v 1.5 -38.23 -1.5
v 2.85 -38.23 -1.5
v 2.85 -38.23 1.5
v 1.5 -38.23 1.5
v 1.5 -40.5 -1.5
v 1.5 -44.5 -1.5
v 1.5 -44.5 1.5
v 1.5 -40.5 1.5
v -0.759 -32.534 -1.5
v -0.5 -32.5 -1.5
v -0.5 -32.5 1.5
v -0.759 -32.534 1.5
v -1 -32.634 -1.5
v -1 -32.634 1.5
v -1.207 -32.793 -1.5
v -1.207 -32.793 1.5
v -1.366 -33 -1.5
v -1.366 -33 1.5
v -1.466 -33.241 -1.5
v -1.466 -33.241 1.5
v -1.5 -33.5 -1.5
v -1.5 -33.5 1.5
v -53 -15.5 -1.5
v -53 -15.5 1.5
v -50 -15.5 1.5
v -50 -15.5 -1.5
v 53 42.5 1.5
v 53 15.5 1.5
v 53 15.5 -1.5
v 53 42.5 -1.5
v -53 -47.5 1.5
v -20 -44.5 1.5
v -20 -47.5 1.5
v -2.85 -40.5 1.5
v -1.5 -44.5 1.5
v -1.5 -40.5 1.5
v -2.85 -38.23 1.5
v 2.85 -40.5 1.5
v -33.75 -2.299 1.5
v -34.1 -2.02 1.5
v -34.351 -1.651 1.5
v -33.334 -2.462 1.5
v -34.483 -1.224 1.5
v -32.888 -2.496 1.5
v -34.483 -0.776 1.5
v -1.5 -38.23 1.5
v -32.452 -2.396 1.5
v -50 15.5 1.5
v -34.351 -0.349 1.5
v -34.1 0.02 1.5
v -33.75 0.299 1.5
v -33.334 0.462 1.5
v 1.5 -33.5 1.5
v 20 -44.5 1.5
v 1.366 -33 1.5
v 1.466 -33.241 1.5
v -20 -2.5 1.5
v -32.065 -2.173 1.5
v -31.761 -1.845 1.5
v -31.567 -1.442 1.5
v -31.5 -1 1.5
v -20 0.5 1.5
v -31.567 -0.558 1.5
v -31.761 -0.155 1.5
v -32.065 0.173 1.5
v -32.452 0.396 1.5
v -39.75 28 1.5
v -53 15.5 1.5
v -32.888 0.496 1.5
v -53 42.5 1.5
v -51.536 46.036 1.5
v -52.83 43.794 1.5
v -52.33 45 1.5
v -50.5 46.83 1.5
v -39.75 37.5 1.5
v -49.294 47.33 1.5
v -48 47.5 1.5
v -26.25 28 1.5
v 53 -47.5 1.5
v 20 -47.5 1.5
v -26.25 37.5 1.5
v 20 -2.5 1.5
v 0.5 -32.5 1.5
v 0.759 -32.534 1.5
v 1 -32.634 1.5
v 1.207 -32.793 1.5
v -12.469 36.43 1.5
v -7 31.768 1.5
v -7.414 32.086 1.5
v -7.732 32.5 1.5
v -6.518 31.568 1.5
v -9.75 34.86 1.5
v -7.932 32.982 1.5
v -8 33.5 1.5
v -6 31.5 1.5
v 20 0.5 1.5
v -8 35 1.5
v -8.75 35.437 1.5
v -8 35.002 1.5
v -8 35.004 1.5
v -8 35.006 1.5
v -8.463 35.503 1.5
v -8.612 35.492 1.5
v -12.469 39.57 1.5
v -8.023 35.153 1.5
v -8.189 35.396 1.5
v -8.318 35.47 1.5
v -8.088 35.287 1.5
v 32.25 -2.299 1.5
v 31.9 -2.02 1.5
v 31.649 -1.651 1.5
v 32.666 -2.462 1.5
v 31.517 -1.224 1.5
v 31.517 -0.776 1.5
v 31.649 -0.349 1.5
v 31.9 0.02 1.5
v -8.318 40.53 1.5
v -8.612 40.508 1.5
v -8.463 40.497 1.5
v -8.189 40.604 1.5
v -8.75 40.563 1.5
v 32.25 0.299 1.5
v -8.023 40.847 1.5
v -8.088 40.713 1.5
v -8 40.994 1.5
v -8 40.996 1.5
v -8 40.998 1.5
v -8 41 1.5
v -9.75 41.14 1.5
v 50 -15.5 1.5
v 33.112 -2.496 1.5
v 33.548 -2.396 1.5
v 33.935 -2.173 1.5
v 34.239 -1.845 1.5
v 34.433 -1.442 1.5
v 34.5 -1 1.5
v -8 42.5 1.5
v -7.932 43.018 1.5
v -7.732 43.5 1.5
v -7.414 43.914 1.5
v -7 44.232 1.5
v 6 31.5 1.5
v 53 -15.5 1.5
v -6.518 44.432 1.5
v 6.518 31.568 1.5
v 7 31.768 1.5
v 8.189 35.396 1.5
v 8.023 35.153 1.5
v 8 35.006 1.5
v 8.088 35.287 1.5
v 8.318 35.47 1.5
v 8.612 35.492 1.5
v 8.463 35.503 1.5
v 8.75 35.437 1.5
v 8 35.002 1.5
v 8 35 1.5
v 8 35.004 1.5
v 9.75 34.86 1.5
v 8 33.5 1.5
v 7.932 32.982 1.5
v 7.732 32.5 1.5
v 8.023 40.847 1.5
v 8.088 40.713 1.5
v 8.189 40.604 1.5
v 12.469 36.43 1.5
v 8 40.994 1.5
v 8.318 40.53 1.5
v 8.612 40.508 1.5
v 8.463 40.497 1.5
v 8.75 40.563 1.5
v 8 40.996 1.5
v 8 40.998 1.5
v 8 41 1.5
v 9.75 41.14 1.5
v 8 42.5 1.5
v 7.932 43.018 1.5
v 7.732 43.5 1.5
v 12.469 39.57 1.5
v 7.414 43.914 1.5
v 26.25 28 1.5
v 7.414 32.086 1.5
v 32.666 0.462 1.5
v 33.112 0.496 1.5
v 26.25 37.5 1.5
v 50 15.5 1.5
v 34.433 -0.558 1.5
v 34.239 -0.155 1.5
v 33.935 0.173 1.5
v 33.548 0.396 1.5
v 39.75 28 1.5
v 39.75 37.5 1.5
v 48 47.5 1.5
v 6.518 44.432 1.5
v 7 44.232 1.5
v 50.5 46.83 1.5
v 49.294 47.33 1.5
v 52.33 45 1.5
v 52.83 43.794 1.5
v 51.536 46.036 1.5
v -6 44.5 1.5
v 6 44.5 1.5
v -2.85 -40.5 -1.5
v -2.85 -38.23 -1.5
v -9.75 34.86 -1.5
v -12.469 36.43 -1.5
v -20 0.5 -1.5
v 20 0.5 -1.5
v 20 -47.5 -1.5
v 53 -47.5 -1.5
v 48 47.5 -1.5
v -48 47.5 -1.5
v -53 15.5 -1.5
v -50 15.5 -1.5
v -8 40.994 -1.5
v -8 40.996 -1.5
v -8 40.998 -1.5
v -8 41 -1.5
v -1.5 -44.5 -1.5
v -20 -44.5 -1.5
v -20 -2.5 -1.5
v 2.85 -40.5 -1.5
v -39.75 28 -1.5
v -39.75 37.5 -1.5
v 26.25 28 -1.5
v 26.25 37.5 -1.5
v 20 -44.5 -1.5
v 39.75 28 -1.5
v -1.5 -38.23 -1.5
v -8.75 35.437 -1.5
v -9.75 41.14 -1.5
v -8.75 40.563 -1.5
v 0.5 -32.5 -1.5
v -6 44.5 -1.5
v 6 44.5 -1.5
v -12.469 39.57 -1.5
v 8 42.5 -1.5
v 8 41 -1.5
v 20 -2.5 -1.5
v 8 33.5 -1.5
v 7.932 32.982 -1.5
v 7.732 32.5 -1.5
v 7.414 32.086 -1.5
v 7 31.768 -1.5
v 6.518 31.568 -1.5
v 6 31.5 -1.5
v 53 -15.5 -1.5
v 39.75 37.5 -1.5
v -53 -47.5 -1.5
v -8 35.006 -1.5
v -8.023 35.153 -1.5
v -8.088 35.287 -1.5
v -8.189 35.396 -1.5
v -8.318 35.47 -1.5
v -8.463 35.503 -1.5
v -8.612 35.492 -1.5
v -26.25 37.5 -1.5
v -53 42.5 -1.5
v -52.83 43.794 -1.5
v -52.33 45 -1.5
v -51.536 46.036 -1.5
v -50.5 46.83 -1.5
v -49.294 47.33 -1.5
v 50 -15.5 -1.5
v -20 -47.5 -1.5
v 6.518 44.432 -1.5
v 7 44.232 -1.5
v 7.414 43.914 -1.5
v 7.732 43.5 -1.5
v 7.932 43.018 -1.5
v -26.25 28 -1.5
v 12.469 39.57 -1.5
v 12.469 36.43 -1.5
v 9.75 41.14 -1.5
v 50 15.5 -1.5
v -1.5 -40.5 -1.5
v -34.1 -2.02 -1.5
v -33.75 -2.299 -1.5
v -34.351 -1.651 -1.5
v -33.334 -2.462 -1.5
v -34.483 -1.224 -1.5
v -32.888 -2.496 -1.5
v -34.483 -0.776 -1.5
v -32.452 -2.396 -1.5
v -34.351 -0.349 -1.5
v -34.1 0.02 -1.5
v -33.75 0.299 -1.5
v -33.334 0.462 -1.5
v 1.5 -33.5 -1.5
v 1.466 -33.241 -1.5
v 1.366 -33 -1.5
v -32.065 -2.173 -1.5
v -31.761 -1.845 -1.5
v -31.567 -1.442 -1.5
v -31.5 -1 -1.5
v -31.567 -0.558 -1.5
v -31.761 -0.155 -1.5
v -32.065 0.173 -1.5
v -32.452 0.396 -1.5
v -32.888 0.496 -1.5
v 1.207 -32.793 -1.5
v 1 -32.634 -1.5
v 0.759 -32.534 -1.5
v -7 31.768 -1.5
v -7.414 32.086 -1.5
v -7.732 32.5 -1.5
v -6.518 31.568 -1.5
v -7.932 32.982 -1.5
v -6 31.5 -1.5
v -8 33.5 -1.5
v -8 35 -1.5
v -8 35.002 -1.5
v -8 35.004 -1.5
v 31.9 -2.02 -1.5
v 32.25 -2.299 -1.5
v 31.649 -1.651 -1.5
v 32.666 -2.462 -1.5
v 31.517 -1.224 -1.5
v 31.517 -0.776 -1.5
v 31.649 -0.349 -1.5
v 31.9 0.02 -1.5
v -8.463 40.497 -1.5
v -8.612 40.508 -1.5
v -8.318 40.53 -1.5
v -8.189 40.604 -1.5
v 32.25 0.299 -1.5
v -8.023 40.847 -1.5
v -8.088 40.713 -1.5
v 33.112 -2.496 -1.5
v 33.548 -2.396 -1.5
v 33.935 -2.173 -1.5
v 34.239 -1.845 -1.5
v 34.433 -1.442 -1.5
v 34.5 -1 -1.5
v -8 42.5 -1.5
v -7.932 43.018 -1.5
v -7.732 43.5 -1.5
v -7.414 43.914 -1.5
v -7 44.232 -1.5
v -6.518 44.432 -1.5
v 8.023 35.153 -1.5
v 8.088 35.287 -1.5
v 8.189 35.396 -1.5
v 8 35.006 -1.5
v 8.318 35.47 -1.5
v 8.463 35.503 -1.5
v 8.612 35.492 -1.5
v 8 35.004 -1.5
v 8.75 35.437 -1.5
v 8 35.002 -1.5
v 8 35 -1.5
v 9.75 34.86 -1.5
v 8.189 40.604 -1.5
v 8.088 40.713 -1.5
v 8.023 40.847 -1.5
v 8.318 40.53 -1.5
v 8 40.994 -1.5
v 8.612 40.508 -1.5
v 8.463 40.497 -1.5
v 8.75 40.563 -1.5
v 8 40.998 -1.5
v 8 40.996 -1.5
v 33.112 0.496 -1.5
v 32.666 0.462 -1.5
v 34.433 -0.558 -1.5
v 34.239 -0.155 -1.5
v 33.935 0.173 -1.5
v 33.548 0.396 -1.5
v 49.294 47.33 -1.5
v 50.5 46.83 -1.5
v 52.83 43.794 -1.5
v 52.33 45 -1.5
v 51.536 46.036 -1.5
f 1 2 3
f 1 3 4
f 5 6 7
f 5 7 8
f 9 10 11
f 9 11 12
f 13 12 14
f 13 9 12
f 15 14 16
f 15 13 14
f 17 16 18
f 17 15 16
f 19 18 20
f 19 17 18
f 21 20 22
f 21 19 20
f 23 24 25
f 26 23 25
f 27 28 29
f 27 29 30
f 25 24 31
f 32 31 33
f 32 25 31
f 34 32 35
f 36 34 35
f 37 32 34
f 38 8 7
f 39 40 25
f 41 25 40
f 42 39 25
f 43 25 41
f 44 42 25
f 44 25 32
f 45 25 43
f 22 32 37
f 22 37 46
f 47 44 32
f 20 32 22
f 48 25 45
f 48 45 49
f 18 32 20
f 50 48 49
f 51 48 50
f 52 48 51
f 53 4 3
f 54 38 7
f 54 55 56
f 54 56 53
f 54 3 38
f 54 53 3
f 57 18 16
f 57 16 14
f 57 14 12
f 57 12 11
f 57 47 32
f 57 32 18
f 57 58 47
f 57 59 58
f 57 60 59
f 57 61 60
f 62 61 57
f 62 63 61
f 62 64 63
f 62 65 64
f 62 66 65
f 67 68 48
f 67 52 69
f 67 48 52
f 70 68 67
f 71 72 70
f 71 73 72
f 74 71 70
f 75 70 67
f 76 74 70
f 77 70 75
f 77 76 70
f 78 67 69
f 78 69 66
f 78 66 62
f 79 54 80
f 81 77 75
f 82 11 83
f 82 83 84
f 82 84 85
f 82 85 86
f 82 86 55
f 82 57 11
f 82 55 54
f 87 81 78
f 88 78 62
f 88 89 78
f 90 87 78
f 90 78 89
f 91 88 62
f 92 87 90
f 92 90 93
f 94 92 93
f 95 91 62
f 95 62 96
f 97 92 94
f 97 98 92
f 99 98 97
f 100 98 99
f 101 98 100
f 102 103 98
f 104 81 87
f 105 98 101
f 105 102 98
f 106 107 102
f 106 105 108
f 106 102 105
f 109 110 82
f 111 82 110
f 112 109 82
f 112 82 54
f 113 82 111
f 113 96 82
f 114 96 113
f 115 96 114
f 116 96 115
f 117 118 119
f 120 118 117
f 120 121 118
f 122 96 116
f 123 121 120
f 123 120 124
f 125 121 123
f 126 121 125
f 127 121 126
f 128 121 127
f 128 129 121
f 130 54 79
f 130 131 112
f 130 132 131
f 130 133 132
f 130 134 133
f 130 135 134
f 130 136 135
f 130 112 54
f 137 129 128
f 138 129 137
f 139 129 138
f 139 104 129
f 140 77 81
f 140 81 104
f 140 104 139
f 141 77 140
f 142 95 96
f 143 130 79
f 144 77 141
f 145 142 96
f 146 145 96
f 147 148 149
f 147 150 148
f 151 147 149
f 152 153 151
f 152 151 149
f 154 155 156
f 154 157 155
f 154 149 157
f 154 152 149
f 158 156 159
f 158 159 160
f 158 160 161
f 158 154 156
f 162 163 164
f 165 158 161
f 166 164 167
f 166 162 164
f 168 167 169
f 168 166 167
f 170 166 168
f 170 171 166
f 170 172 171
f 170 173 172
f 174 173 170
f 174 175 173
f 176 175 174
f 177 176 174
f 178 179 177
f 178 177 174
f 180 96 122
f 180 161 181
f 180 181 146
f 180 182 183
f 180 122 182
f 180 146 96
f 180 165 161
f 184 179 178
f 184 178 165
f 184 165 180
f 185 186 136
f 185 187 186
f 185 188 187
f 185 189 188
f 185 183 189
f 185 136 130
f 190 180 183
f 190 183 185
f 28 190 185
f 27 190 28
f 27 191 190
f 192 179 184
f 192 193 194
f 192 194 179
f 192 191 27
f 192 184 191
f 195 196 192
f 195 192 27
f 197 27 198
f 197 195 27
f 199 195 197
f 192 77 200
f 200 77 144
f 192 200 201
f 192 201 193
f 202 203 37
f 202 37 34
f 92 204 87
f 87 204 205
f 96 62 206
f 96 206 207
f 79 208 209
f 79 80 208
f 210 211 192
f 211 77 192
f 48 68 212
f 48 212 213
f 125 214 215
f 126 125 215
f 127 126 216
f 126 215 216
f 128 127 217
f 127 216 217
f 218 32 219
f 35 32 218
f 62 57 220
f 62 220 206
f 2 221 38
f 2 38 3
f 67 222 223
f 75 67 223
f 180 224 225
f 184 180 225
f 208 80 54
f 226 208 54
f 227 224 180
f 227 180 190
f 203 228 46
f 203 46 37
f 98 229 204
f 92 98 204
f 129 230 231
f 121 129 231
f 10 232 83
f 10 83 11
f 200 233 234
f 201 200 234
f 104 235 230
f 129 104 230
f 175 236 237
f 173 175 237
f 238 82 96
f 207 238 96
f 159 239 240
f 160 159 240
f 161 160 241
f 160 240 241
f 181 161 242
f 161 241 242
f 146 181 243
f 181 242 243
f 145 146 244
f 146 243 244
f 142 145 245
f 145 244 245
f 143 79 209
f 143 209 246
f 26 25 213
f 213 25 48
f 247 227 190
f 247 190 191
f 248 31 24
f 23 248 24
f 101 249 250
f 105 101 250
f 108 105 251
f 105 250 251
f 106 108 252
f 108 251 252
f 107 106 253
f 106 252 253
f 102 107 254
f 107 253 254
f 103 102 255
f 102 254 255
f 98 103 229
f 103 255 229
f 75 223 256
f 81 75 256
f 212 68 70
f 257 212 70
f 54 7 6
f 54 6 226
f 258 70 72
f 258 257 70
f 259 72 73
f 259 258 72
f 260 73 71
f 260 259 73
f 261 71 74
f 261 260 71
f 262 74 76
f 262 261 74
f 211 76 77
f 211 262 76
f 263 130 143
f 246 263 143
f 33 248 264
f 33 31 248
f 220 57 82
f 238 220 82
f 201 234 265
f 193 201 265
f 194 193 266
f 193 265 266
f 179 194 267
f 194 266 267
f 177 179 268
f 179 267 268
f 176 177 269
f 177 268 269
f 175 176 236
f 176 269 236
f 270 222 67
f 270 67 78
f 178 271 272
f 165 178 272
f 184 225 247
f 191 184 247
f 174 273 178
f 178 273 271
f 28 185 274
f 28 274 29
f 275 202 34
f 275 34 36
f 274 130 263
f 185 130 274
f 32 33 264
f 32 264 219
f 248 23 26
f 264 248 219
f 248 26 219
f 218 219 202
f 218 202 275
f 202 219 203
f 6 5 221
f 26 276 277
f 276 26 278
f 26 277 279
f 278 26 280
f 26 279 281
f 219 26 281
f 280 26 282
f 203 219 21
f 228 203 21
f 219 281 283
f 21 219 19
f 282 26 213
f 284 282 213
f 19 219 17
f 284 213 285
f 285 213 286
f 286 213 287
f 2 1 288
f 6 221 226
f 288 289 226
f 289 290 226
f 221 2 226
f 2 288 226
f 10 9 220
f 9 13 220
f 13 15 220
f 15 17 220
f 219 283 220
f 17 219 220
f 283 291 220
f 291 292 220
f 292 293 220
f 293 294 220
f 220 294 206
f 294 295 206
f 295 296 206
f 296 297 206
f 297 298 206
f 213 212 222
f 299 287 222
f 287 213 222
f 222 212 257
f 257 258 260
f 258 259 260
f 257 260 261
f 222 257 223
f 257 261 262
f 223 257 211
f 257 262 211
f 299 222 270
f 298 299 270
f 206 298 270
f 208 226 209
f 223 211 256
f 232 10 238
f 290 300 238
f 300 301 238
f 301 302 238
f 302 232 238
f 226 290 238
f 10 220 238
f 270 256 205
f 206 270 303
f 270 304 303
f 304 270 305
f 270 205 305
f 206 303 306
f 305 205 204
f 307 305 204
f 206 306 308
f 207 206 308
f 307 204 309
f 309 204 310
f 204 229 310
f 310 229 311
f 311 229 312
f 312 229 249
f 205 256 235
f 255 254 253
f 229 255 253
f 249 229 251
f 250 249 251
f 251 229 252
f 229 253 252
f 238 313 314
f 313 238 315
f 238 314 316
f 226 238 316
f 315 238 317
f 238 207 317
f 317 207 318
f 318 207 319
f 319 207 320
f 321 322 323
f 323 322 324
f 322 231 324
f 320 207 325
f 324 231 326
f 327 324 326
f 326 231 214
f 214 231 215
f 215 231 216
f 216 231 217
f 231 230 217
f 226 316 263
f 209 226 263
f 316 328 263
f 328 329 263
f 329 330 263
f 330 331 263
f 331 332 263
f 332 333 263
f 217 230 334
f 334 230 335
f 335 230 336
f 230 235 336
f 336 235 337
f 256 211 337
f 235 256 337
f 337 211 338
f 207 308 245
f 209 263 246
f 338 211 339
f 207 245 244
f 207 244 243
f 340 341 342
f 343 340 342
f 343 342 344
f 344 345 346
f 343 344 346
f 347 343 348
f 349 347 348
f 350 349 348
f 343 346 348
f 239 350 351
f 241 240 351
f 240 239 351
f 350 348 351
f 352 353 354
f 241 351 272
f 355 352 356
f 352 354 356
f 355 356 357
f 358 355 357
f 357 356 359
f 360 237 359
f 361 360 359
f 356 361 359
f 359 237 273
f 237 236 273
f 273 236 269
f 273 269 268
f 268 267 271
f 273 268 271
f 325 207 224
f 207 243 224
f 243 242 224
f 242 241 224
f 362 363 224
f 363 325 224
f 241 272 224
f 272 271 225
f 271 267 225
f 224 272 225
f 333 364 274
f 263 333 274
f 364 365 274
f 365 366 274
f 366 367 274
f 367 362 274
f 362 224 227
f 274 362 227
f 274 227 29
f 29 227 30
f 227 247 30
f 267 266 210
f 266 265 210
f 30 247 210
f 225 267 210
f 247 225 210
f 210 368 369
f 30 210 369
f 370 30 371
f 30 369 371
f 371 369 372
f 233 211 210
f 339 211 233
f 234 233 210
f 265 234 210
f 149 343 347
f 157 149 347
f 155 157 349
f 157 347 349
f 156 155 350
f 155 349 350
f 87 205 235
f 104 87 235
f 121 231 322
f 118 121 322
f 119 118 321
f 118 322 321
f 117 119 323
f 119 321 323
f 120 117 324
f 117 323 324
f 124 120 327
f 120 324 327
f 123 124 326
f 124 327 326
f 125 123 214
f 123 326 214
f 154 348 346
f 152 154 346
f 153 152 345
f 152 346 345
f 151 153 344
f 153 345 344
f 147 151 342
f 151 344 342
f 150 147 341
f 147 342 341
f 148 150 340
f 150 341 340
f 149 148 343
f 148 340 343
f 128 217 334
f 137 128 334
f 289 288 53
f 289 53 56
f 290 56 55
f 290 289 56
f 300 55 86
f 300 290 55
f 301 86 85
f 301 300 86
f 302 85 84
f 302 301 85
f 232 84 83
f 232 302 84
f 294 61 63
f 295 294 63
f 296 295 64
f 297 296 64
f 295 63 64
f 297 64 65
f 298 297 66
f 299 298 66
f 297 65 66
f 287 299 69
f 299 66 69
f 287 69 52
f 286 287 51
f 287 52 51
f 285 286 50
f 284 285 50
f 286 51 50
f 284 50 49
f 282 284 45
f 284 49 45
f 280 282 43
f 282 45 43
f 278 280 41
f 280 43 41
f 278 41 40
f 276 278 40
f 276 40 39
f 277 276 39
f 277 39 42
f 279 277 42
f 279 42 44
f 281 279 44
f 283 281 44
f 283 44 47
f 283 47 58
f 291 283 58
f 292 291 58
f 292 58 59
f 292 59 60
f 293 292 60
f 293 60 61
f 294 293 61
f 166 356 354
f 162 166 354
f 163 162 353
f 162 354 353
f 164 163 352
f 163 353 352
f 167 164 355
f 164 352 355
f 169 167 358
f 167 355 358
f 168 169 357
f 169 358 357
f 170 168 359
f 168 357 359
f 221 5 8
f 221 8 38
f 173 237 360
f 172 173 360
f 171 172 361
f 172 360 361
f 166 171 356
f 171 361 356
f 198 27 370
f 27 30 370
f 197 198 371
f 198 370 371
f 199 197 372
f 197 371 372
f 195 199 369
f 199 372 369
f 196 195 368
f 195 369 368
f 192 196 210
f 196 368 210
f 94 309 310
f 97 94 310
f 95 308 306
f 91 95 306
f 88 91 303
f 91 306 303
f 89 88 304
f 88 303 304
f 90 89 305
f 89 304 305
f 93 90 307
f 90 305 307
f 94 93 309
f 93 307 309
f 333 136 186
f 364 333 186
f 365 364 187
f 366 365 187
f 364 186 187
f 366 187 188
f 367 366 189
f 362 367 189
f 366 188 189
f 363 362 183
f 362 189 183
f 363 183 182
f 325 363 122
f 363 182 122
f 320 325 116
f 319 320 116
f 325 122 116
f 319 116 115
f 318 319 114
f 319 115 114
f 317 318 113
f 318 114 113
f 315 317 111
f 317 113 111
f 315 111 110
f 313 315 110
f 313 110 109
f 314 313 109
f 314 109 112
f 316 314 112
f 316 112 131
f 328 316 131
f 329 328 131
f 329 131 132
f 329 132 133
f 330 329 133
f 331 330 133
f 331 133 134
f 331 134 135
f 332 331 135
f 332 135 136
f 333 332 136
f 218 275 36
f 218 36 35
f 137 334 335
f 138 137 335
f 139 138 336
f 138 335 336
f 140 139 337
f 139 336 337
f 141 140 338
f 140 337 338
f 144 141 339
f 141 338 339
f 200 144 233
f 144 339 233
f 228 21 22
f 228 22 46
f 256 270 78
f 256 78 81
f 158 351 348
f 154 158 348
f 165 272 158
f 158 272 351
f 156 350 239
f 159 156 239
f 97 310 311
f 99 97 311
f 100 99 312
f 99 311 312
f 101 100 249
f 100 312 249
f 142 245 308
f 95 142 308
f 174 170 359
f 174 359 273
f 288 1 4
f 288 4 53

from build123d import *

# Parameters (mm, degrees)
ESBO_O1_W                = 100
ESBO_O1_H                = 95
RESSALTO_EXTRUS_O1_DEPTH = 1.5
ESBO_O3_W                = 3
ESBO_O3_H                = 32
RESSALTO_EXTRUS_O2_DEPTH = 3
ESBO_O2_R                = 1.5
ESBO_O2_W                = 40
ESBO_O2_H                = 3
CORTE_EXTRUS_O1_DEPTH    = 4
CUT_EXTRUDE7_DEPTH       = 2.5
CUT_EXTRUDE7_DEPTH_BACK  = 2.5
CUT_EXTRUDE5_DEPTH       = 2.5
CUT_EXTRUDE5_DEPTH_BACK  = 2.5
SKETCH7_W                = 13.5
SKETCH7_H                = 9.5
CUT_EXTRUDE6_DEPTH       = 2.5
CUT_EXTRUDE6_DEPTH_BACK  = 2.5
FILLET2_R                = 5


with BuildPart() as part:
    # Esboço1 → Ressalto-extrusão1 (new body, symmetric)
    with BuildSketch(Plane.XY):
        Rectangle(ESBO_O1_W, ESBO_O1_H)
    extrude(amount=RESSALTO_EXTRUS_O1_DEPTH, both=True)

    # Esboço3 → Ressalto-extrusão2 (add, through all)
    with BuildSketch(Plane.XY.offset(1.5)):
        with Locations((-51.5, 31.5)):
            Rectangle(ESBO_O3_W, ESBO_O3_H)
        with Locations((-51.5, -31.5)):
            Rectangle(ESBO_O3_W, ESBO_O3_H)
        with Locations((51.5, -31.5)):
            Rectangle(ESBO_O3_W, ESBO_O3_H)
        with Locations((51.5, 31.5)):
            Rectangle(ESBO_O3_W, ESBO_O3_H)
    extrude(amount=-RESSALTO_EXTRUS_O2_DEPTH)

    # Esboço2 → Corte-extrusão1 (cut, through all)
    with BuildSketch(Plane.XY.offset(1.5)):
        with Locations((-33, -1)):
            Circle(ESBO_O2_R)
        with Locations((33, -1)):
            Circle(ESBO_O2_R)
        with Locations((0, -46)):
            Rectangle(ESBO_O2_W, ESBO_O2_H)
        with Locations((0, -1)):
            Rectangle(ESBO_O2_W, ESBO_O2_H)
    extrude(amount=-CORTE_EXTRUS_O1_DEPTH, mode=Mode.SUBTRACT)

    # Sketch9 → Cut-Extrude7 (cut, two sides)
    with BuildSketch(Plane.XY) as cut_extrude7_sk:
        with BuildLine():
            Line((-1.5, -44.5), (1.5, -44.5))
            Line((1.5, -44.5), (1.5, -40.5))
            Line((1.5, -40.5), (2.85, -40.5))
            Line((2.85, -40.5), (2.85, -38.23))
            Line((2.85, -38.23), (1.5, -38.23))
            Line((1.5, -38.23), (1.5, -33.5))
            ThreePointArc((1.5, -33.5), (1.207106781, -32.792893219), (0.5, -32.5))
            Line((0.5, -32.5), (-0.5, -32.5))
            ThreePointArc((-0.5, -32.5), (-1.207106781, -32.792893219), (-1.5, -33.5))
            Line((-1.5, -33.5), (-1.5, -38.23))
            Line((-1.5, -38.23), (-2.85, -38.23))
            Line((-2.85, -38.23), (-2.85, -40.5))
            Line((-2.85, -40.5), (-1.5, -40.5))
            Line((-1.5, -40.5), (-1.5, -44.5))
        make_face()
    extrude(amount=CUT_EXTRUDE7_DEPTH, mode=Mode.SUBTRACT)
    extrude(cut_extrude7_sk.sketch, amount=-CUT_EXTRUDE7_DEPTH_BACK, mode=Mode.SUBTRACT)

    # Sketch6 → Cut-Extrude5 (cut, two sides)
    with BuildSketch(Plane.XY) as cut_extrude5_sk:
        with BuildLine():
            Line((-6, 44.5), (6, 44.5))
            ThreePointArc((6, 44.5), (7.414213562, 43.914213562), (8, 42.5))
            Line((8, 42.5), (8, 41))
            ThreePointArc((8, 41), (8.000003519, 40.99675088), (8.000014076, 40.993501776))
            ThreePointArc((8.000014076, 40.993501776), (8.25094791, 40.562114644), (8.750009384, 40.562655149))
            Line((8.750009384, 40.562655149), (9.75, 41.14))
            Line((9.75, 41.14), (12.469319768, 39.57))
            Line((12.469319768, 39.57), (12.469319768, 36.43))
            Line((12.469319768, 36.43), (9.75, 34.86))
            Line((9.75, 34.86), (8.750009384, 35.437344851))
            ThreePointArc((8.750009384, 35.437344851), (8.25094791, 35.437885356), (8.000014076, 35.006498224))
            ThreePointArc((8.000014076, 35.006498224), (8.000003519, 35.00324912), (8, 35))
            Line((8, 35), (8, 33.5))
            ThreePointArc((8, 33.5), (7.414213562, 32.085786438), (6, 31.5))
            Line((6, 31.5), (-6, 31.5))
            ThreePointArc((-6, 31.5), (-7.414213562, 32.085786438), (-8, 33.5))
            Line((-8, 33.5), (-8, 35))
            ThreePointArc((-8, 35), (-8.000003519, 35.00324912), (-8.000014076, 35.006498224))
            ThreePointArc((-8.000014076, 35.006498224), (-8.25094791, 35.437885356), (-8.750009384, 35.437344851))
            Line((-8.750009384, 35.437344851), (-9.75, 34.86))
            Line((-9.75, 34.86), (-12.469319768, 36.43))
            Line((-12.469319768, 36.43), (-12.469319768, 39.57))
            Line((-12.469319768, 39.57), (-9.75, 41.14))
            Line((-9.75, 41.14), (-8.750009384, 40.562655149))
            ThreePointArc((-8.750009384, 40.562655149), (-8.25094791, 40.562114644), (-8.000014076, 40.993501776))
            ThreePointArc((-8.000014076, 40.993501776), (-8.000003519, 40.99675088), (-8, 41))
            Line((-8, 41), (-8, 42.5))
            ThreePointArc((-8, 42.5), (-7.414213562, 43.914213562), (-6, 44.5))
        make_face()
    extrude(amount=CUT_EXTRUDE5_DEPTH, mode=Mode.SUBTRACT)
    extrude(cut_extrude5_sk.sketch, amount=-CUT_EXTRUDE5_DEPTH_BACK, mode=Mode.SUBTRACT)

    # Sketch7 → Cut-Extrude6 (cut, two sides)
    with BuildSketch(Plane.XY) as cut_extrude6_sk:
        with Locations((-33, 32.75)):
            Rectangle(SKETCH7_W, SKETCH7_H)
        with Locations((33, 32.75)):
            Rectangle(SKETCH7_W, SKETCH7_H)
    extrude(amount=CUT_EXTRUDE6_DEPTH, mode=Mode.SUBTRACT)
    extrude(cut_extrude6_sk.sketch, amount=-CUT_EXTRUDE6_DEPTH_BACK, mode=Mode.SUBTRACT)

    # Fillet2
    fillet2_edges = [part.edges().sort_by_distance(p)[0] for p in [
        (-53, 47.5, 0),
        (53, 47.5, 0),
    ]]
    fillet(fillet2_edges, radius=FILLET2_R)


solid = part.part
